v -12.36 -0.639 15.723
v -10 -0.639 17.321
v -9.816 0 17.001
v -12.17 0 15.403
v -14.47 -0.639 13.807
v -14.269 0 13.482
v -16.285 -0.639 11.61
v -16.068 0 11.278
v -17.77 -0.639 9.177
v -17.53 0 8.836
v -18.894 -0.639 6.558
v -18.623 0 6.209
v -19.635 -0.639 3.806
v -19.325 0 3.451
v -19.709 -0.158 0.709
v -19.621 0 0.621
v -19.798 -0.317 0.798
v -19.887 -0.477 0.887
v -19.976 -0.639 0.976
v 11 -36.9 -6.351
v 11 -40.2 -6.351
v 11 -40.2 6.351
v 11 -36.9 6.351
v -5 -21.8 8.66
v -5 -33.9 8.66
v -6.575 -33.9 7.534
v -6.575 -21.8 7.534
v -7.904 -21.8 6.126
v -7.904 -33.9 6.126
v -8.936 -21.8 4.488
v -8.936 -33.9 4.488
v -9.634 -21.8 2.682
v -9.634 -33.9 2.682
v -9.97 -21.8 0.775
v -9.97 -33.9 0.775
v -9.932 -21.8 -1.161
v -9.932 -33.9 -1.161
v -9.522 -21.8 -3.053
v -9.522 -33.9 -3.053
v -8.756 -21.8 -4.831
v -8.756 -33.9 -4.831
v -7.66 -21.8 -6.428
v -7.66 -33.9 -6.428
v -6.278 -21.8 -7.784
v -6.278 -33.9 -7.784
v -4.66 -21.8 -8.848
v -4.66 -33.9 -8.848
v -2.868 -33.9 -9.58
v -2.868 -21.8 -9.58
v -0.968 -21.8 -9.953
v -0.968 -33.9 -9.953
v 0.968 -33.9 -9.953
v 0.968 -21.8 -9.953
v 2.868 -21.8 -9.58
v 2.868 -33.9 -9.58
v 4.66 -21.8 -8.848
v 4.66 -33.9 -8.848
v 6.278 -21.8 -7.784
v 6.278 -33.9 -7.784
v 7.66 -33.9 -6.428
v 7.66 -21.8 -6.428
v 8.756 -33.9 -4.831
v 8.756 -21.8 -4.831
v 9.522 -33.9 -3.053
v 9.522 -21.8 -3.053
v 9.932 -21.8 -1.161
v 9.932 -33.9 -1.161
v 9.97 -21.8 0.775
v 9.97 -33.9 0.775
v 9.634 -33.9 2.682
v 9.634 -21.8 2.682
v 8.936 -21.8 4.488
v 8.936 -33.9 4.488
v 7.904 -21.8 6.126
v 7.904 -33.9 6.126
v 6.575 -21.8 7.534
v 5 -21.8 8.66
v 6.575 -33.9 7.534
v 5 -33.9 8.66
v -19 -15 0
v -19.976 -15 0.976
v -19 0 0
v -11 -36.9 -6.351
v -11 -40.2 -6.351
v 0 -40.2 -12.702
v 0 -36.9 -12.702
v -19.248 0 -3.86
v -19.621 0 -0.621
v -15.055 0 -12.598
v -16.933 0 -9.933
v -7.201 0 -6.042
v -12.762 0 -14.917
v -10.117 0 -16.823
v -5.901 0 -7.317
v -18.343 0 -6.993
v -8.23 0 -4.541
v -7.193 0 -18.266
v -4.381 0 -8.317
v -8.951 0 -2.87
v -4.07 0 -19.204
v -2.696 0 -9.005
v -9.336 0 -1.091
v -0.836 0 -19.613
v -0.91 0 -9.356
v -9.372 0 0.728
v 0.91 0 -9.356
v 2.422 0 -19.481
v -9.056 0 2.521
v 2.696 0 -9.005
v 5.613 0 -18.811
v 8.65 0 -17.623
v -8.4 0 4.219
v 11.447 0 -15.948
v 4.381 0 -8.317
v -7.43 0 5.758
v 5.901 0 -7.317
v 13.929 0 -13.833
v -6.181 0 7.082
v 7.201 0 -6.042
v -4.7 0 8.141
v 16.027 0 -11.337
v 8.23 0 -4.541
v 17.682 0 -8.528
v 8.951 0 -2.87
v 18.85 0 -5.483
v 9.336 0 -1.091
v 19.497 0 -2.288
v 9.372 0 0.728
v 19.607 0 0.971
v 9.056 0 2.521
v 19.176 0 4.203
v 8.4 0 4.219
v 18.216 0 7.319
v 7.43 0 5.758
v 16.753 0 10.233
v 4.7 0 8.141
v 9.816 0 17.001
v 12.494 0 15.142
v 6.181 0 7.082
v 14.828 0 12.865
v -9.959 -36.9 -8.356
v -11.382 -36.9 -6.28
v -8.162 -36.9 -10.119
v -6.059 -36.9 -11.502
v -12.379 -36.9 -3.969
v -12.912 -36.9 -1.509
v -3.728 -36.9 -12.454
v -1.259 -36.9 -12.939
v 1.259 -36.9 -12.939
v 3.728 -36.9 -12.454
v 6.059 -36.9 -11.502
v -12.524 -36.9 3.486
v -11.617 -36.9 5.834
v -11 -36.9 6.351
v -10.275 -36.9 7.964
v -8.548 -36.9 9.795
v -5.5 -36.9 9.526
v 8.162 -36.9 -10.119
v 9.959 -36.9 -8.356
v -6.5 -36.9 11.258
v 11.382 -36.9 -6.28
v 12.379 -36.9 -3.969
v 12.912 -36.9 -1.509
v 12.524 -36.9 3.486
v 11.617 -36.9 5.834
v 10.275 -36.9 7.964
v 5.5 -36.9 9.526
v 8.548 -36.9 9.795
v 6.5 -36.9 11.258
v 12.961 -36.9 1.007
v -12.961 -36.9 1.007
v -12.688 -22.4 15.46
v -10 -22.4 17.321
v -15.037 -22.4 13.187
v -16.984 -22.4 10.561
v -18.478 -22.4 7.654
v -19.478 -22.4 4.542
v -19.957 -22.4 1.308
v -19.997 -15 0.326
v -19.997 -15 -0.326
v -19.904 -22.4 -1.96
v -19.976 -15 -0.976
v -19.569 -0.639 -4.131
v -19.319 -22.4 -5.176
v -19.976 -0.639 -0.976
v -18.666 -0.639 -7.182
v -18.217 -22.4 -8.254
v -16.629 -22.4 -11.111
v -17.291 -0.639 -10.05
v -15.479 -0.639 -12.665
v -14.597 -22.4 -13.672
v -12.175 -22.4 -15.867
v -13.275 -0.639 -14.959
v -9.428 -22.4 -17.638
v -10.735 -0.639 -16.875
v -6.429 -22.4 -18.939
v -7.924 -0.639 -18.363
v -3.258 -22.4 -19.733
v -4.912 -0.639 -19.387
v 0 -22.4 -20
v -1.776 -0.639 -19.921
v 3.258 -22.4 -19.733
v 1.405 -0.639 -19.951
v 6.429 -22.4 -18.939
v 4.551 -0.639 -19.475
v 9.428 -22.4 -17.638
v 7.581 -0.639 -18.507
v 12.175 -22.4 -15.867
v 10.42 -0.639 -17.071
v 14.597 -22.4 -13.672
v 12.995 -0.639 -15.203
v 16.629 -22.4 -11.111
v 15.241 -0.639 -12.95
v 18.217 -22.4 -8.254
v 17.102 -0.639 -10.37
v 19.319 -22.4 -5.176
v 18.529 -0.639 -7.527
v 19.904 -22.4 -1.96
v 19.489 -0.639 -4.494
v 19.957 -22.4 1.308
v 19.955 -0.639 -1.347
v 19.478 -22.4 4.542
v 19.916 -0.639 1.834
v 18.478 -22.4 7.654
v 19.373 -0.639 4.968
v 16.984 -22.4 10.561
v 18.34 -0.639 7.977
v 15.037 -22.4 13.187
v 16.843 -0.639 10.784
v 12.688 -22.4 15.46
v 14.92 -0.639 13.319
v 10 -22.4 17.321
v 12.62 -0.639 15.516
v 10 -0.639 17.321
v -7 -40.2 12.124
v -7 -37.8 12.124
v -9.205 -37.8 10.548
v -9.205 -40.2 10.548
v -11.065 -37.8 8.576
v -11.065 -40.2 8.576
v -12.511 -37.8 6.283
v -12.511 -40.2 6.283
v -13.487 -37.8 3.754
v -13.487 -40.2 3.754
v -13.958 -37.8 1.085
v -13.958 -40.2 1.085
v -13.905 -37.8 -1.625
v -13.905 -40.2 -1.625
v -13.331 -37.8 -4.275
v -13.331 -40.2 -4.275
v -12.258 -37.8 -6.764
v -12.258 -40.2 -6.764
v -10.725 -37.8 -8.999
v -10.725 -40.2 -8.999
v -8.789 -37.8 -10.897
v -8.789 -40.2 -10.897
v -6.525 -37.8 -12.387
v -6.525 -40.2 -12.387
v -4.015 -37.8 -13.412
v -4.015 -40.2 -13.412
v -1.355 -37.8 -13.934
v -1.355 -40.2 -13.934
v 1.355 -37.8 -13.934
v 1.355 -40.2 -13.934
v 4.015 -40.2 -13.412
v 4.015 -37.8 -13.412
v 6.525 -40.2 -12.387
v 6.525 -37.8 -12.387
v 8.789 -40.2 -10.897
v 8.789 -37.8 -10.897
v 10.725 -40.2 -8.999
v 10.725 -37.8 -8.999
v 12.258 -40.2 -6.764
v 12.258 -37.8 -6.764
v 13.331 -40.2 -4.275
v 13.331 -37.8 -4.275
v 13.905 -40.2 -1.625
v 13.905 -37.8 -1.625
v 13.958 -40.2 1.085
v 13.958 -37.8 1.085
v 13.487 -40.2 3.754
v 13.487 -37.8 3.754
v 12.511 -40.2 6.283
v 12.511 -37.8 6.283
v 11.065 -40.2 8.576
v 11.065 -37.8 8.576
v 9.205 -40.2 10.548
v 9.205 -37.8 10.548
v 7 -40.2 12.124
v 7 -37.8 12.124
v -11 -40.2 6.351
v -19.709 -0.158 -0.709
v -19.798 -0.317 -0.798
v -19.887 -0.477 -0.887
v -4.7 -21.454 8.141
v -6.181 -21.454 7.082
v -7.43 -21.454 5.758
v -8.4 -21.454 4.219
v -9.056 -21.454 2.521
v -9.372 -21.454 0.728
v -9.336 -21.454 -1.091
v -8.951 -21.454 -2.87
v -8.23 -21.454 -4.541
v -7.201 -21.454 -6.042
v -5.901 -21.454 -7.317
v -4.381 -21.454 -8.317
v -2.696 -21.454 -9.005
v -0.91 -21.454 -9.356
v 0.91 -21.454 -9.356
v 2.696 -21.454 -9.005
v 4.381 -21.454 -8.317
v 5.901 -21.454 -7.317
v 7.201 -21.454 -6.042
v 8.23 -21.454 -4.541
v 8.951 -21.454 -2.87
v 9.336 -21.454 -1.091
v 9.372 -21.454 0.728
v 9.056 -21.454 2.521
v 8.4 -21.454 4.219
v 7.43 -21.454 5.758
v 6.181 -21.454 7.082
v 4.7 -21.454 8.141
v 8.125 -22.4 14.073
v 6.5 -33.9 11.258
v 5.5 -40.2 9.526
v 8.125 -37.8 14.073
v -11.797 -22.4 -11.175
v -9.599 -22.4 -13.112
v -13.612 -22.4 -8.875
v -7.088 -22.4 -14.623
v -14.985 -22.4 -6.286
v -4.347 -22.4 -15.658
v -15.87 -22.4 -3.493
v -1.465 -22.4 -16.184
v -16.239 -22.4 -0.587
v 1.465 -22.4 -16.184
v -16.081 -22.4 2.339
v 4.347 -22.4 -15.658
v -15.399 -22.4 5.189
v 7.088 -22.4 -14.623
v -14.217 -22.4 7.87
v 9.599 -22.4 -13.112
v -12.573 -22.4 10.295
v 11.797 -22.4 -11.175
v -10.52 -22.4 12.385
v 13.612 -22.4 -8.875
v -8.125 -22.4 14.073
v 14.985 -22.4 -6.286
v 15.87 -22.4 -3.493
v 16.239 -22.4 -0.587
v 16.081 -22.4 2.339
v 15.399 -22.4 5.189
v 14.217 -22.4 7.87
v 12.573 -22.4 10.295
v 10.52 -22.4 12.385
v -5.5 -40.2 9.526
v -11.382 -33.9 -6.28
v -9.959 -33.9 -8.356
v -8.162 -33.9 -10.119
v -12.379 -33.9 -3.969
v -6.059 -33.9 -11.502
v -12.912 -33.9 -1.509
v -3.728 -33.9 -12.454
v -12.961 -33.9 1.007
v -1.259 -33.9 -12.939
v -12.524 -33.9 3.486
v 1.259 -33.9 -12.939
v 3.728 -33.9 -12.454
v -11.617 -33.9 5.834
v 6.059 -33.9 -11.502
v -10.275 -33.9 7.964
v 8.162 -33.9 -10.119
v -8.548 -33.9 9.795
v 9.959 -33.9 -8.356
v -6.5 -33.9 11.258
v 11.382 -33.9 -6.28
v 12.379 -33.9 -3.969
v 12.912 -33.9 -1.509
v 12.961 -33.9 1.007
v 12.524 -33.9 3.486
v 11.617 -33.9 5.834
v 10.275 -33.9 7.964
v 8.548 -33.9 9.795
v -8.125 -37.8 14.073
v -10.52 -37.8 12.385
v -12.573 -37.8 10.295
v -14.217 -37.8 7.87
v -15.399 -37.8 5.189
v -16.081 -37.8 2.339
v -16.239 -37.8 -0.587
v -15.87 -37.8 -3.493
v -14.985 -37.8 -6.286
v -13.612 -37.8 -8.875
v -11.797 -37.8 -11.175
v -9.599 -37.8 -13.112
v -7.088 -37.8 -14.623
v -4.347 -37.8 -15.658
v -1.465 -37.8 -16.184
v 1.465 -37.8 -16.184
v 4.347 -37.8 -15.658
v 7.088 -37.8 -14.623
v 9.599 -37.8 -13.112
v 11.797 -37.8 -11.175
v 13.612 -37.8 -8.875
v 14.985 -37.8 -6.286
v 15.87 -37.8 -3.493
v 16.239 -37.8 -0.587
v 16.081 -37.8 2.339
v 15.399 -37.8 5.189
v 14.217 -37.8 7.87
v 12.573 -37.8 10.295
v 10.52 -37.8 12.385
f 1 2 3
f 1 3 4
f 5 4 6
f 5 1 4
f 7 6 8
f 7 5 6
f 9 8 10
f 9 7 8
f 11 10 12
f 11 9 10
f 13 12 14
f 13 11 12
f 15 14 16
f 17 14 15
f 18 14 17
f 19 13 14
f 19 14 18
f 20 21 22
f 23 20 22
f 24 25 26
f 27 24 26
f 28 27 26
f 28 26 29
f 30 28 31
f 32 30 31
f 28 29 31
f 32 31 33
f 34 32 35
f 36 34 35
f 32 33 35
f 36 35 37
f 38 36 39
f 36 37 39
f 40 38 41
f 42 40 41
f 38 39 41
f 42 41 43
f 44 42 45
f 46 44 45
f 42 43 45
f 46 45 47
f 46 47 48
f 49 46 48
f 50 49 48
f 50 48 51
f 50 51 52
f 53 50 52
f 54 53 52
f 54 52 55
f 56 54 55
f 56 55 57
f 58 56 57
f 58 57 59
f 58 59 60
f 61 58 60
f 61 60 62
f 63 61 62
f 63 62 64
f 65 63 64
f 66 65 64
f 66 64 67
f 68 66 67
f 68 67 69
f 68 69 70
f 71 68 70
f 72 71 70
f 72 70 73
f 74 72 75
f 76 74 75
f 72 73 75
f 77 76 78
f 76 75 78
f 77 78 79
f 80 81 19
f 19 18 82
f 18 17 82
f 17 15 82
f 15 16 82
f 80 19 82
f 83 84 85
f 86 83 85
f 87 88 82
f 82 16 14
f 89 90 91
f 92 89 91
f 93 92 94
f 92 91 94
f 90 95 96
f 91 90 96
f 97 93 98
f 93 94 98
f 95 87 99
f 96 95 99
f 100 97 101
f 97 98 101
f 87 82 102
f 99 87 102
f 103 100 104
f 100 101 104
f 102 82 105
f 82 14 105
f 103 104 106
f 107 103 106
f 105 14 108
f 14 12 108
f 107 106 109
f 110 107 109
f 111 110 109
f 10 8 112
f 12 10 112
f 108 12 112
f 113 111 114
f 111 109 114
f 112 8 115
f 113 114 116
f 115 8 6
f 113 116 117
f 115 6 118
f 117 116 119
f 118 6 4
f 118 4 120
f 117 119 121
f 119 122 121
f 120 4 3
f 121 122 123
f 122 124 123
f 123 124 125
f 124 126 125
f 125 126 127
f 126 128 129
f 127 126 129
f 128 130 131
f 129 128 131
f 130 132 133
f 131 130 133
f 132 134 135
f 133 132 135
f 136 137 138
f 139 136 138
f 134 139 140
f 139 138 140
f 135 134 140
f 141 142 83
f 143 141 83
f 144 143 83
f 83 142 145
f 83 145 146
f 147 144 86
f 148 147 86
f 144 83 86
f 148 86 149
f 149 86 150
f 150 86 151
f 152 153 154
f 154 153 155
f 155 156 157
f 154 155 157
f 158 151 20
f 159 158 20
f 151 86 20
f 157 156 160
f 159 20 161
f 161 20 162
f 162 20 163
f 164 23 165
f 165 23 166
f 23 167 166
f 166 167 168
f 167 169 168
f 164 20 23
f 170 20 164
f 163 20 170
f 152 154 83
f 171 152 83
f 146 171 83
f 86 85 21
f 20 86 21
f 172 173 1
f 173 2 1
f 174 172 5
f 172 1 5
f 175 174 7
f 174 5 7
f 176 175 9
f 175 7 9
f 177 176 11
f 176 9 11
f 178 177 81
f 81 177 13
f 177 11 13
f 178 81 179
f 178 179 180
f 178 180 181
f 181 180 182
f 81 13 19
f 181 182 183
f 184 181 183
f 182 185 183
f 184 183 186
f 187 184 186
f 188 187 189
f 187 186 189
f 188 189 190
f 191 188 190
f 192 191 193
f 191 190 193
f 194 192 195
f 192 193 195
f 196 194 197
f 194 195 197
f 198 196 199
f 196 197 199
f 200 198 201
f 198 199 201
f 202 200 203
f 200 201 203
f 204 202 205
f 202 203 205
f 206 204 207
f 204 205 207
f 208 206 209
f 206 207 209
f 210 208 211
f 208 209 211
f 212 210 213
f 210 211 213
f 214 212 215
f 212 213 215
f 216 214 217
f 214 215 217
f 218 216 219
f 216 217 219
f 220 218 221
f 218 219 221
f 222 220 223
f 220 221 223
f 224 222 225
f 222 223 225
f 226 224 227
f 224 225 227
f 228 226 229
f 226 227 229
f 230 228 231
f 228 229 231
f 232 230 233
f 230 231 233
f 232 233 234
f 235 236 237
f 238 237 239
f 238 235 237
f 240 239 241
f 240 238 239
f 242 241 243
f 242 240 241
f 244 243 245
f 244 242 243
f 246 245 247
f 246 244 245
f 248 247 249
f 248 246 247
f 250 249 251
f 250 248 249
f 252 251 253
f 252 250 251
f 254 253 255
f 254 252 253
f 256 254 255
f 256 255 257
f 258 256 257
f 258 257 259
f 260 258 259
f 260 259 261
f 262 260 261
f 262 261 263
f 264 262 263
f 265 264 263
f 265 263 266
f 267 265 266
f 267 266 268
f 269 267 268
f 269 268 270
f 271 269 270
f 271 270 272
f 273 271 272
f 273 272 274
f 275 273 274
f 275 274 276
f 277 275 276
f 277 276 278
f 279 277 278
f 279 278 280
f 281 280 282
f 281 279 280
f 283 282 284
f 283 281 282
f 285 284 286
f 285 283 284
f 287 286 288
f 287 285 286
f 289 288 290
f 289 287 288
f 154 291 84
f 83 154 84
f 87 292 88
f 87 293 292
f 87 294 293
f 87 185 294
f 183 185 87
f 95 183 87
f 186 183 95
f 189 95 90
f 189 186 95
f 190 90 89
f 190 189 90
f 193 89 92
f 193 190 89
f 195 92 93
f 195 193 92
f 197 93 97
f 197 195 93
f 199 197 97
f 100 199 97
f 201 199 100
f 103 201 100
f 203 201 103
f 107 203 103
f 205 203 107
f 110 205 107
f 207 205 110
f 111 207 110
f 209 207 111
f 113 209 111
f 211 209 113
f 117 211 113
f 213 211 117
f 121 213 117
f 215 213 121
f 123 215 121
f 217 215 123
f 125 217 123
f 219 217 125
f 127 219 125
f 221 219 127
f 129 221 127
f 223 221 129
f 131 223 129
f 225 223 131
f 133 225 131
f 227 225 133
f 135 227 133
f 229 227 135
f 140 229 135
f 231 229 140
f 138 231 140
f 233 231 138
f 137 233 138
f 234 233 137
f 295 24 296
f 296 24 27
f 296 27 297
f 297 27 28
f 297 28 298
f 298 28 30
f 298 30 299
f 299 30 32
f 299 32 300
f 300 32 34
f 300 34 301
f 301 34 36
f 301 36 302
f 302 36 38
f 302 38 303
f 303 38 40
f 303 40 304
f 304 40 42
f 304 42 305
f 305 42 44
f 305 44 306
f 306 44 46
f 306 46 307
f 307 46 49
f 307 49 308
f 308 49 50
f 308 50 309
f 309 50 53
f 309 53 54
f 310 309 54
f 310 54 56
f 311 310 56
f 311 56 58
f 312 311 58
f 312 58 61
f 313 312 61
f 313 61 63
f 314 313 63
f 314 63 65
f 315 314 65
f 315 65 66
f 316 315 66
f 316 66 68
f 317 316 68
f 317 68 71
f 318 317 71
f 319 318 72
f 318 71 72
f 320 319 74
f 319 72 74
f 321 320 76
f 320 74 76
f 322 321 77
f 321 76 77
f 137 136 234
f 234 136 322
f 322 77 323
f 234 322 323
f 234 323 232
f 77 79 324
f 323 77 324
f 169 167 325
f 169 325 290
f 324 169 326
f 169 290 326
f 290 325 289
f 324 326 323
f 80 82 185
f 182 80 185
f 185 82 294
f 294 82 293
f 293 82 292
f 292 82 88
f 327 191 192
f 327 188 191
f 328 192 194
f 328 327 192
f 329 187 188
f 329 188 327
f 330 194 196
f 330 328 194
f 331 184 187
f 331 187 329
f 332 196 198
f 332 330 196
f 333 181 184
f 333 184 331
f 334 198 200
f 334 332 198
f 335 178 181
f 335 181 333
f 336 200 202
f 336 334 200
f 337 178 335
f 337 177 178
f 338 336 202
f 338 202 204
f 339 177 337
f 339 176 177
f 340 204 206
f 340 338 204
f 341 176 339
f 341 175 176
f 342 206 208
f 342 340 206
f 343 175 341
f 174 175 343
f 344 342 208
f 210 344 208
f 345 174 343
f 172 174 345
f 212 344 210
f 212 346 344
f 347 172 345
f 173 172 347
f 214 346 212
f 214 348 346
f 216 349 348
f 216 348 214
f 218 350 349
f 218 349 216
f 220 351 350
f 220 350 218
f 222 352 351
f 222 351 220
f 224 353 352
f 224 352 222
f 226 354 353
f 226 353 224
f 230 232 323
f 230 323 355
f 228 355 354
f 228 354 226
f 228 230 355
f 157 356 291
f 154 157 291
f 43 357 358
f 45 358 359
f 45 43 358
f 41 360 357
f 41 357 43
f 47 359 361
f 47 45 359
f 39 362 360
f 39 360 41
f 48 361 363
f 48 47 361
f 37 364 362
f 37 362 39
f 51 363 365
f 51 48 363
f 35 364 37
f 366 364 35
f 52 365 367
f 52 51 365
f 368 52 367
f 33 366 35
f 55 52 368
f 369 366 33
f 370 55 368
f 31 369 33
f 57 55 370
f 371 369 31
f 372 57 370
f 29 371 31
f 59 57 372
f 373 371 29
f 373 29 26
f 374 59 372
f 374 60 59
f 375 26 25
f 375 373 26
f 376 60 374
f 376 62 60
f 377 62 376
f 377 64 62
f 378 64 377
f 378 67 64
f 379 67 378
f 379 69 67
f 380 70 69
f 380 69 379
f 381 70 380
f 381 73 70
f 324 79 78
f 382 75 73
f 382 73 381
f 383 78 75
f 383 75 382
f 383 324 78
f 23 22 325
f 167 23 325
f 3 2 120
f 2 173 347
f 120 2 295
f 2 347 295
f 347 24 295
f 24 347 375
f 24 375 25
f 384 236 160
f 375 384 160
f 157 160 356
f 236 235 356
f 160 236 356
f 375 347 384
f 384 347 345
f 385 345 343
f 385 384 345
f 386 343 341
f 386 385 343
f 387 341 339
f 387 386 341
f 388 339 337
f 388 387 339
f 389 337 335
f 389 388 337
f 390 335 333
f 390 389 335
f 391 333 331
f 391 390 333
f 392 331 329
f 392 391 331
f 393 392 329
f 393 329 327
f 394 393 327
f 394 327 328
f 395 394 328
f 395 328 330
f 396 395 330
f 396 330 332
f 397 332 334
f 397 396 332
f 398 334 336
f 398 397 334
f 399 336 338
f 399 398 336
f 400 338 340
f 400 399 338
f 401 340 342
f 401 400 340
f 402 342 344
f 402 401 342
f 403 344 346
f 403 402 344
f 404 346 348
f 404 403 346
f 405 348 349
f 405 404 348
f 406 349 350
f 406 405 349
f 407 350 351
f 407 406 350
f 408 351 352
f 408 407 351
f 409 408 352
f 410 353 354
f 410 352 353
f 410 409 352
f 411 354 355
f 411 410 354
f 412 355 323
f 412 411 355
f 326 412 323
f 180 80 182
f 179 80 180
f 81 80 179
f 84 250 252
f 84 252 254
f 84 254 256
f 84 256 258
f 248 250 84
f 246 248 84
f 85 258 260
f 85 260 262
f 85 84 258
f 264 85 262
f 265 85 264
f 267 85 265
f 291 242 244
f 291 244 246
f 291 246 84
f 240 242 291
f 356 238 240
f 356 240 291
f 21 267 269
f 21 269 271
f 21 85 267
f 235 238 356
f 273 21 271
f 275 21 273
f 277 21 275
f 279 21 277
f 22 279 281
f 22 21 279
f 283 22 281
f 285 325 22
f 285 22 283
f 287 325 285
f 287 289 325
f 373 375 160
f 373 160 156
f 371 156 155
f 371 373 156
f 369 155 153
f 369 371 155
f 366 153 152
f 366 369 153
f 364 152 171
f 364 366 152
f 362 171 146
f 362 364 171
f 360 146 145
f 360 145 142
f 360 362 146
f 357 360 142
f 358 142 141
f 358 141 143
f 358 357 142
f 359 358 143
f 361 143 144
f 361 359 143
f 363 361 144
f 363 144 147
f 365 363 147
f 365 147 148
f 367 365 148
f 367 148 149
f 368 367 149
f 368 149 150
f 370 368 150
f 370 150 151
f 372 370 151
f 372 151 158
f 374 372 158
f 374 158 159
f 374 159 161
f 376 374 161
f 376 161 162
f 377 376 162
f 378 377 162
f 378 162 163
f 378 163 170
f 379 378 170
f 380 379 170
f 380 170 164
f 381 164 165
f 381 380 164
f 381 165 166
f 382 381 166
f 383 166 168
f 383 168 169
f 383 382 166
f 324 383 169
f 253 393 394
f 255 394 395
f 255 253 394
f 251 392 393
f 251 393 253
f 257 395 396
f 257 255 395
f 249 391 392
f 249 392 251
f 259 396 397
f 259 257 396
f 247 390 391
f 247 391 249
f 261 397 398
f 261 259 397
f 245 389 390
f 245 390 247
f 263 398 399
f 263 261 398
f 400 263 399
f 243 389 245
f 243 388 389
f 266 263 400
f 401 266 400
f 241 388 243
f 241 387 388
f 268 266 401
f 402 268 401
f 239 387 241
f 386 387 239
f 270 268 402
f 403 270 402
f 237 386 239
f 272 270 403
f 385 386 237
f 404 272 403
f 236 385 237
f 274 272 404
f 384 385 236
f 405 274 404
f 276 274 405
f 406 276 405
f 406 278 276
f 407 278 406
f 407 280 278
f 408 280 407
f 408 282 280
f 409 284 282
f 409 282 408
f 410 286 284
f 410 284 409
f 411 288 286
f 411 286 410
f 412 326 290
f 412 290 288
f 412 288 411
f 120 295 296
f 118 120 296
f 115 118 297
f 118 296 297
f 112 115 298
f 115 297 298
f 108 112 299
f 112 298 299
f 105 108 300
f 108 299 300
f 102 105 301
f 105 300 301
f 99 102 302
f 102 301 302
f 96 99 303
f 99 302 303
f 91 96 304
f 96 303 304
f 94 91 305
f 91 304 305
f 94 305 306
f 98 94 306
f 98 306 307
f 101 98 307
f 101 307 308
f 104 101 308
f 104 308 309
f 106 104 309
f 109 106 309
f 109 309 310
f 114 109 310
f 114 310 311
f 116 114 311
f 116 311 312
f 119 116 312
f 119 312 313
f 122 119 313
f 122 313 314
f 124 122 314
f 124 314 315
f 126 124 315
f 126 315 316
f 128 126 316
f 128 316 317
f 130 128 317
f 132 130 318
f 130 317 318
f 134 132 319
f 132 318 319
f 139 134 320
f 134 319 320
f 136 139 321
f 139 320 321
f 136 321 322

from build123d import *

# Parameters (mm, degrees)
F0_R      = 20
F1_DEPTH  = 40.2
F2_R      = 20
F2_R_2    = 16.25
F3_DEPTH  = 17.8
F5_DEPTH  = 40.201
F7_R      = 13
F8_DEPTH  = 3
F10_DEPTH = 5
F11_R     = 16.25
F11_R_2   = 14
F12_DEPTH = 2.4
F14_DEPTH = 15
F18_R     = 10
F19_DEPTH = 18.4


with BuildPart() as f1:
    # F0 (on Front) → F1 (new body)
    with BuildSketch(Plane.XZ):
        Circle(F0_R)
    extrude(amount=F1_DEPTH)

    # F2 (on face) → F3 (cut)
    with BuildSketch(Plane.XZ.offset(40.2)):
        Circle(F2_R)
        Circle(F2_R_2, mode=Mode.SUBTRACT)
    extrude(amount=-F3_DEPTH, mode=Mode.SUBTRACT)

    # F4 (on face) → F5 (cut, through all)
    with BuildSketch(Plane.XZ.offset(40.2)):
        with BuildLine():
            Line((-10, 17.3205080757), (-4.7, 8.1406387956))
            ThreePointArc((-4.7, 8.1406387956), (0, -9.4), (4.7, 8.1406387956))
            Line((4.7, 8.1406387956), (10, 17.3205080757))
            ThreePointArc((10, 17.3205080757), (0, 20), (-10, 17.3205080757))
        make_face()
    extrude(amount=-F5_DEPTH, mode=Mode.SUBTRACT)

    # F7 (on offset) → F8 (cut)
    with BuildSketch(Plane.XZ.offset(33.9)):
        Circle(F7_R)
    extrude(amount=F8_DEPTH, mode=Mode.SUBTRACT)

    # F9 (on face) → F10 (cut)
    with BuildSketch(Plane.XZ.offset(40.2)):
        Polygon((11, -6.3508529611), (11, 6.3508529611), (0, 12.7017059222), (-11, 6.3508529611), (-11, -6.3508529611), (0, -12.7017059222), align=None)
    extrude(amount=-F10_DEPTH, mode=Mode.SUBTRACT)

    # F11 (on face) → F12 (cut)
    with BuildSketch(Plane.XZ.offset(40.2)):
        Circle(F11_R)
        Circle(F11_R_2, mode=Mode.SUBTRACT)
    extrude(amount=-F12_DEPTH, mode=Mode.SUBTRACT)

    # F13 (on face) → F14 (cut)
    with BuildSketch(Plane(origin=(0, 0, 0), x_dir=(-1, 0, 0), z_dir=(0, 1, 0))):
        with BuildLine():
            Line((19.9761634199, 0.9761634199), (19, 0))
            Line((19, 0), (19.9761634199, -0.9761634199))
            ThreePointArc((19.9761634199, -0.9761634199), (20, 0), (19.9761634199, 0.9761634199))
        make_face()
    extrude(amount=-F14_DEPTH, mode=Mode.SUBTRACT)

    # F15 (on Right) → F16 (revolve, cut)
    with BuildSketch(Plane.YZ):
        Polygon((-0.639097304, -20), (0, -20), (0, -19.6310169995), align=None)
    revolve(axis=Axis((0, -40.2, 0), (0, -1, 0)), mode=Mode.SUBTRACT)

    # F18 (on face) → F19 (cut)
    with BuildSketch(Plane.XZ.offset(40.2)):
        Circle(F18_R)
    extrude(amount=-F19_DEPTH, mode=Mode.SUBTRACT)

    # F20 (on Top) → F21 (revolve, cut)
    with BuildSketch(Plane.XY):
        Polygon((-10, -21.8), (-9.4, -21.8), (-9.4, -21.4535898385), align=None)
    revolve(axis=Axis((0, -40.2, 0), (0, -1, 0)), mode=Mode.SUBTRACT)


solid = f1.part
